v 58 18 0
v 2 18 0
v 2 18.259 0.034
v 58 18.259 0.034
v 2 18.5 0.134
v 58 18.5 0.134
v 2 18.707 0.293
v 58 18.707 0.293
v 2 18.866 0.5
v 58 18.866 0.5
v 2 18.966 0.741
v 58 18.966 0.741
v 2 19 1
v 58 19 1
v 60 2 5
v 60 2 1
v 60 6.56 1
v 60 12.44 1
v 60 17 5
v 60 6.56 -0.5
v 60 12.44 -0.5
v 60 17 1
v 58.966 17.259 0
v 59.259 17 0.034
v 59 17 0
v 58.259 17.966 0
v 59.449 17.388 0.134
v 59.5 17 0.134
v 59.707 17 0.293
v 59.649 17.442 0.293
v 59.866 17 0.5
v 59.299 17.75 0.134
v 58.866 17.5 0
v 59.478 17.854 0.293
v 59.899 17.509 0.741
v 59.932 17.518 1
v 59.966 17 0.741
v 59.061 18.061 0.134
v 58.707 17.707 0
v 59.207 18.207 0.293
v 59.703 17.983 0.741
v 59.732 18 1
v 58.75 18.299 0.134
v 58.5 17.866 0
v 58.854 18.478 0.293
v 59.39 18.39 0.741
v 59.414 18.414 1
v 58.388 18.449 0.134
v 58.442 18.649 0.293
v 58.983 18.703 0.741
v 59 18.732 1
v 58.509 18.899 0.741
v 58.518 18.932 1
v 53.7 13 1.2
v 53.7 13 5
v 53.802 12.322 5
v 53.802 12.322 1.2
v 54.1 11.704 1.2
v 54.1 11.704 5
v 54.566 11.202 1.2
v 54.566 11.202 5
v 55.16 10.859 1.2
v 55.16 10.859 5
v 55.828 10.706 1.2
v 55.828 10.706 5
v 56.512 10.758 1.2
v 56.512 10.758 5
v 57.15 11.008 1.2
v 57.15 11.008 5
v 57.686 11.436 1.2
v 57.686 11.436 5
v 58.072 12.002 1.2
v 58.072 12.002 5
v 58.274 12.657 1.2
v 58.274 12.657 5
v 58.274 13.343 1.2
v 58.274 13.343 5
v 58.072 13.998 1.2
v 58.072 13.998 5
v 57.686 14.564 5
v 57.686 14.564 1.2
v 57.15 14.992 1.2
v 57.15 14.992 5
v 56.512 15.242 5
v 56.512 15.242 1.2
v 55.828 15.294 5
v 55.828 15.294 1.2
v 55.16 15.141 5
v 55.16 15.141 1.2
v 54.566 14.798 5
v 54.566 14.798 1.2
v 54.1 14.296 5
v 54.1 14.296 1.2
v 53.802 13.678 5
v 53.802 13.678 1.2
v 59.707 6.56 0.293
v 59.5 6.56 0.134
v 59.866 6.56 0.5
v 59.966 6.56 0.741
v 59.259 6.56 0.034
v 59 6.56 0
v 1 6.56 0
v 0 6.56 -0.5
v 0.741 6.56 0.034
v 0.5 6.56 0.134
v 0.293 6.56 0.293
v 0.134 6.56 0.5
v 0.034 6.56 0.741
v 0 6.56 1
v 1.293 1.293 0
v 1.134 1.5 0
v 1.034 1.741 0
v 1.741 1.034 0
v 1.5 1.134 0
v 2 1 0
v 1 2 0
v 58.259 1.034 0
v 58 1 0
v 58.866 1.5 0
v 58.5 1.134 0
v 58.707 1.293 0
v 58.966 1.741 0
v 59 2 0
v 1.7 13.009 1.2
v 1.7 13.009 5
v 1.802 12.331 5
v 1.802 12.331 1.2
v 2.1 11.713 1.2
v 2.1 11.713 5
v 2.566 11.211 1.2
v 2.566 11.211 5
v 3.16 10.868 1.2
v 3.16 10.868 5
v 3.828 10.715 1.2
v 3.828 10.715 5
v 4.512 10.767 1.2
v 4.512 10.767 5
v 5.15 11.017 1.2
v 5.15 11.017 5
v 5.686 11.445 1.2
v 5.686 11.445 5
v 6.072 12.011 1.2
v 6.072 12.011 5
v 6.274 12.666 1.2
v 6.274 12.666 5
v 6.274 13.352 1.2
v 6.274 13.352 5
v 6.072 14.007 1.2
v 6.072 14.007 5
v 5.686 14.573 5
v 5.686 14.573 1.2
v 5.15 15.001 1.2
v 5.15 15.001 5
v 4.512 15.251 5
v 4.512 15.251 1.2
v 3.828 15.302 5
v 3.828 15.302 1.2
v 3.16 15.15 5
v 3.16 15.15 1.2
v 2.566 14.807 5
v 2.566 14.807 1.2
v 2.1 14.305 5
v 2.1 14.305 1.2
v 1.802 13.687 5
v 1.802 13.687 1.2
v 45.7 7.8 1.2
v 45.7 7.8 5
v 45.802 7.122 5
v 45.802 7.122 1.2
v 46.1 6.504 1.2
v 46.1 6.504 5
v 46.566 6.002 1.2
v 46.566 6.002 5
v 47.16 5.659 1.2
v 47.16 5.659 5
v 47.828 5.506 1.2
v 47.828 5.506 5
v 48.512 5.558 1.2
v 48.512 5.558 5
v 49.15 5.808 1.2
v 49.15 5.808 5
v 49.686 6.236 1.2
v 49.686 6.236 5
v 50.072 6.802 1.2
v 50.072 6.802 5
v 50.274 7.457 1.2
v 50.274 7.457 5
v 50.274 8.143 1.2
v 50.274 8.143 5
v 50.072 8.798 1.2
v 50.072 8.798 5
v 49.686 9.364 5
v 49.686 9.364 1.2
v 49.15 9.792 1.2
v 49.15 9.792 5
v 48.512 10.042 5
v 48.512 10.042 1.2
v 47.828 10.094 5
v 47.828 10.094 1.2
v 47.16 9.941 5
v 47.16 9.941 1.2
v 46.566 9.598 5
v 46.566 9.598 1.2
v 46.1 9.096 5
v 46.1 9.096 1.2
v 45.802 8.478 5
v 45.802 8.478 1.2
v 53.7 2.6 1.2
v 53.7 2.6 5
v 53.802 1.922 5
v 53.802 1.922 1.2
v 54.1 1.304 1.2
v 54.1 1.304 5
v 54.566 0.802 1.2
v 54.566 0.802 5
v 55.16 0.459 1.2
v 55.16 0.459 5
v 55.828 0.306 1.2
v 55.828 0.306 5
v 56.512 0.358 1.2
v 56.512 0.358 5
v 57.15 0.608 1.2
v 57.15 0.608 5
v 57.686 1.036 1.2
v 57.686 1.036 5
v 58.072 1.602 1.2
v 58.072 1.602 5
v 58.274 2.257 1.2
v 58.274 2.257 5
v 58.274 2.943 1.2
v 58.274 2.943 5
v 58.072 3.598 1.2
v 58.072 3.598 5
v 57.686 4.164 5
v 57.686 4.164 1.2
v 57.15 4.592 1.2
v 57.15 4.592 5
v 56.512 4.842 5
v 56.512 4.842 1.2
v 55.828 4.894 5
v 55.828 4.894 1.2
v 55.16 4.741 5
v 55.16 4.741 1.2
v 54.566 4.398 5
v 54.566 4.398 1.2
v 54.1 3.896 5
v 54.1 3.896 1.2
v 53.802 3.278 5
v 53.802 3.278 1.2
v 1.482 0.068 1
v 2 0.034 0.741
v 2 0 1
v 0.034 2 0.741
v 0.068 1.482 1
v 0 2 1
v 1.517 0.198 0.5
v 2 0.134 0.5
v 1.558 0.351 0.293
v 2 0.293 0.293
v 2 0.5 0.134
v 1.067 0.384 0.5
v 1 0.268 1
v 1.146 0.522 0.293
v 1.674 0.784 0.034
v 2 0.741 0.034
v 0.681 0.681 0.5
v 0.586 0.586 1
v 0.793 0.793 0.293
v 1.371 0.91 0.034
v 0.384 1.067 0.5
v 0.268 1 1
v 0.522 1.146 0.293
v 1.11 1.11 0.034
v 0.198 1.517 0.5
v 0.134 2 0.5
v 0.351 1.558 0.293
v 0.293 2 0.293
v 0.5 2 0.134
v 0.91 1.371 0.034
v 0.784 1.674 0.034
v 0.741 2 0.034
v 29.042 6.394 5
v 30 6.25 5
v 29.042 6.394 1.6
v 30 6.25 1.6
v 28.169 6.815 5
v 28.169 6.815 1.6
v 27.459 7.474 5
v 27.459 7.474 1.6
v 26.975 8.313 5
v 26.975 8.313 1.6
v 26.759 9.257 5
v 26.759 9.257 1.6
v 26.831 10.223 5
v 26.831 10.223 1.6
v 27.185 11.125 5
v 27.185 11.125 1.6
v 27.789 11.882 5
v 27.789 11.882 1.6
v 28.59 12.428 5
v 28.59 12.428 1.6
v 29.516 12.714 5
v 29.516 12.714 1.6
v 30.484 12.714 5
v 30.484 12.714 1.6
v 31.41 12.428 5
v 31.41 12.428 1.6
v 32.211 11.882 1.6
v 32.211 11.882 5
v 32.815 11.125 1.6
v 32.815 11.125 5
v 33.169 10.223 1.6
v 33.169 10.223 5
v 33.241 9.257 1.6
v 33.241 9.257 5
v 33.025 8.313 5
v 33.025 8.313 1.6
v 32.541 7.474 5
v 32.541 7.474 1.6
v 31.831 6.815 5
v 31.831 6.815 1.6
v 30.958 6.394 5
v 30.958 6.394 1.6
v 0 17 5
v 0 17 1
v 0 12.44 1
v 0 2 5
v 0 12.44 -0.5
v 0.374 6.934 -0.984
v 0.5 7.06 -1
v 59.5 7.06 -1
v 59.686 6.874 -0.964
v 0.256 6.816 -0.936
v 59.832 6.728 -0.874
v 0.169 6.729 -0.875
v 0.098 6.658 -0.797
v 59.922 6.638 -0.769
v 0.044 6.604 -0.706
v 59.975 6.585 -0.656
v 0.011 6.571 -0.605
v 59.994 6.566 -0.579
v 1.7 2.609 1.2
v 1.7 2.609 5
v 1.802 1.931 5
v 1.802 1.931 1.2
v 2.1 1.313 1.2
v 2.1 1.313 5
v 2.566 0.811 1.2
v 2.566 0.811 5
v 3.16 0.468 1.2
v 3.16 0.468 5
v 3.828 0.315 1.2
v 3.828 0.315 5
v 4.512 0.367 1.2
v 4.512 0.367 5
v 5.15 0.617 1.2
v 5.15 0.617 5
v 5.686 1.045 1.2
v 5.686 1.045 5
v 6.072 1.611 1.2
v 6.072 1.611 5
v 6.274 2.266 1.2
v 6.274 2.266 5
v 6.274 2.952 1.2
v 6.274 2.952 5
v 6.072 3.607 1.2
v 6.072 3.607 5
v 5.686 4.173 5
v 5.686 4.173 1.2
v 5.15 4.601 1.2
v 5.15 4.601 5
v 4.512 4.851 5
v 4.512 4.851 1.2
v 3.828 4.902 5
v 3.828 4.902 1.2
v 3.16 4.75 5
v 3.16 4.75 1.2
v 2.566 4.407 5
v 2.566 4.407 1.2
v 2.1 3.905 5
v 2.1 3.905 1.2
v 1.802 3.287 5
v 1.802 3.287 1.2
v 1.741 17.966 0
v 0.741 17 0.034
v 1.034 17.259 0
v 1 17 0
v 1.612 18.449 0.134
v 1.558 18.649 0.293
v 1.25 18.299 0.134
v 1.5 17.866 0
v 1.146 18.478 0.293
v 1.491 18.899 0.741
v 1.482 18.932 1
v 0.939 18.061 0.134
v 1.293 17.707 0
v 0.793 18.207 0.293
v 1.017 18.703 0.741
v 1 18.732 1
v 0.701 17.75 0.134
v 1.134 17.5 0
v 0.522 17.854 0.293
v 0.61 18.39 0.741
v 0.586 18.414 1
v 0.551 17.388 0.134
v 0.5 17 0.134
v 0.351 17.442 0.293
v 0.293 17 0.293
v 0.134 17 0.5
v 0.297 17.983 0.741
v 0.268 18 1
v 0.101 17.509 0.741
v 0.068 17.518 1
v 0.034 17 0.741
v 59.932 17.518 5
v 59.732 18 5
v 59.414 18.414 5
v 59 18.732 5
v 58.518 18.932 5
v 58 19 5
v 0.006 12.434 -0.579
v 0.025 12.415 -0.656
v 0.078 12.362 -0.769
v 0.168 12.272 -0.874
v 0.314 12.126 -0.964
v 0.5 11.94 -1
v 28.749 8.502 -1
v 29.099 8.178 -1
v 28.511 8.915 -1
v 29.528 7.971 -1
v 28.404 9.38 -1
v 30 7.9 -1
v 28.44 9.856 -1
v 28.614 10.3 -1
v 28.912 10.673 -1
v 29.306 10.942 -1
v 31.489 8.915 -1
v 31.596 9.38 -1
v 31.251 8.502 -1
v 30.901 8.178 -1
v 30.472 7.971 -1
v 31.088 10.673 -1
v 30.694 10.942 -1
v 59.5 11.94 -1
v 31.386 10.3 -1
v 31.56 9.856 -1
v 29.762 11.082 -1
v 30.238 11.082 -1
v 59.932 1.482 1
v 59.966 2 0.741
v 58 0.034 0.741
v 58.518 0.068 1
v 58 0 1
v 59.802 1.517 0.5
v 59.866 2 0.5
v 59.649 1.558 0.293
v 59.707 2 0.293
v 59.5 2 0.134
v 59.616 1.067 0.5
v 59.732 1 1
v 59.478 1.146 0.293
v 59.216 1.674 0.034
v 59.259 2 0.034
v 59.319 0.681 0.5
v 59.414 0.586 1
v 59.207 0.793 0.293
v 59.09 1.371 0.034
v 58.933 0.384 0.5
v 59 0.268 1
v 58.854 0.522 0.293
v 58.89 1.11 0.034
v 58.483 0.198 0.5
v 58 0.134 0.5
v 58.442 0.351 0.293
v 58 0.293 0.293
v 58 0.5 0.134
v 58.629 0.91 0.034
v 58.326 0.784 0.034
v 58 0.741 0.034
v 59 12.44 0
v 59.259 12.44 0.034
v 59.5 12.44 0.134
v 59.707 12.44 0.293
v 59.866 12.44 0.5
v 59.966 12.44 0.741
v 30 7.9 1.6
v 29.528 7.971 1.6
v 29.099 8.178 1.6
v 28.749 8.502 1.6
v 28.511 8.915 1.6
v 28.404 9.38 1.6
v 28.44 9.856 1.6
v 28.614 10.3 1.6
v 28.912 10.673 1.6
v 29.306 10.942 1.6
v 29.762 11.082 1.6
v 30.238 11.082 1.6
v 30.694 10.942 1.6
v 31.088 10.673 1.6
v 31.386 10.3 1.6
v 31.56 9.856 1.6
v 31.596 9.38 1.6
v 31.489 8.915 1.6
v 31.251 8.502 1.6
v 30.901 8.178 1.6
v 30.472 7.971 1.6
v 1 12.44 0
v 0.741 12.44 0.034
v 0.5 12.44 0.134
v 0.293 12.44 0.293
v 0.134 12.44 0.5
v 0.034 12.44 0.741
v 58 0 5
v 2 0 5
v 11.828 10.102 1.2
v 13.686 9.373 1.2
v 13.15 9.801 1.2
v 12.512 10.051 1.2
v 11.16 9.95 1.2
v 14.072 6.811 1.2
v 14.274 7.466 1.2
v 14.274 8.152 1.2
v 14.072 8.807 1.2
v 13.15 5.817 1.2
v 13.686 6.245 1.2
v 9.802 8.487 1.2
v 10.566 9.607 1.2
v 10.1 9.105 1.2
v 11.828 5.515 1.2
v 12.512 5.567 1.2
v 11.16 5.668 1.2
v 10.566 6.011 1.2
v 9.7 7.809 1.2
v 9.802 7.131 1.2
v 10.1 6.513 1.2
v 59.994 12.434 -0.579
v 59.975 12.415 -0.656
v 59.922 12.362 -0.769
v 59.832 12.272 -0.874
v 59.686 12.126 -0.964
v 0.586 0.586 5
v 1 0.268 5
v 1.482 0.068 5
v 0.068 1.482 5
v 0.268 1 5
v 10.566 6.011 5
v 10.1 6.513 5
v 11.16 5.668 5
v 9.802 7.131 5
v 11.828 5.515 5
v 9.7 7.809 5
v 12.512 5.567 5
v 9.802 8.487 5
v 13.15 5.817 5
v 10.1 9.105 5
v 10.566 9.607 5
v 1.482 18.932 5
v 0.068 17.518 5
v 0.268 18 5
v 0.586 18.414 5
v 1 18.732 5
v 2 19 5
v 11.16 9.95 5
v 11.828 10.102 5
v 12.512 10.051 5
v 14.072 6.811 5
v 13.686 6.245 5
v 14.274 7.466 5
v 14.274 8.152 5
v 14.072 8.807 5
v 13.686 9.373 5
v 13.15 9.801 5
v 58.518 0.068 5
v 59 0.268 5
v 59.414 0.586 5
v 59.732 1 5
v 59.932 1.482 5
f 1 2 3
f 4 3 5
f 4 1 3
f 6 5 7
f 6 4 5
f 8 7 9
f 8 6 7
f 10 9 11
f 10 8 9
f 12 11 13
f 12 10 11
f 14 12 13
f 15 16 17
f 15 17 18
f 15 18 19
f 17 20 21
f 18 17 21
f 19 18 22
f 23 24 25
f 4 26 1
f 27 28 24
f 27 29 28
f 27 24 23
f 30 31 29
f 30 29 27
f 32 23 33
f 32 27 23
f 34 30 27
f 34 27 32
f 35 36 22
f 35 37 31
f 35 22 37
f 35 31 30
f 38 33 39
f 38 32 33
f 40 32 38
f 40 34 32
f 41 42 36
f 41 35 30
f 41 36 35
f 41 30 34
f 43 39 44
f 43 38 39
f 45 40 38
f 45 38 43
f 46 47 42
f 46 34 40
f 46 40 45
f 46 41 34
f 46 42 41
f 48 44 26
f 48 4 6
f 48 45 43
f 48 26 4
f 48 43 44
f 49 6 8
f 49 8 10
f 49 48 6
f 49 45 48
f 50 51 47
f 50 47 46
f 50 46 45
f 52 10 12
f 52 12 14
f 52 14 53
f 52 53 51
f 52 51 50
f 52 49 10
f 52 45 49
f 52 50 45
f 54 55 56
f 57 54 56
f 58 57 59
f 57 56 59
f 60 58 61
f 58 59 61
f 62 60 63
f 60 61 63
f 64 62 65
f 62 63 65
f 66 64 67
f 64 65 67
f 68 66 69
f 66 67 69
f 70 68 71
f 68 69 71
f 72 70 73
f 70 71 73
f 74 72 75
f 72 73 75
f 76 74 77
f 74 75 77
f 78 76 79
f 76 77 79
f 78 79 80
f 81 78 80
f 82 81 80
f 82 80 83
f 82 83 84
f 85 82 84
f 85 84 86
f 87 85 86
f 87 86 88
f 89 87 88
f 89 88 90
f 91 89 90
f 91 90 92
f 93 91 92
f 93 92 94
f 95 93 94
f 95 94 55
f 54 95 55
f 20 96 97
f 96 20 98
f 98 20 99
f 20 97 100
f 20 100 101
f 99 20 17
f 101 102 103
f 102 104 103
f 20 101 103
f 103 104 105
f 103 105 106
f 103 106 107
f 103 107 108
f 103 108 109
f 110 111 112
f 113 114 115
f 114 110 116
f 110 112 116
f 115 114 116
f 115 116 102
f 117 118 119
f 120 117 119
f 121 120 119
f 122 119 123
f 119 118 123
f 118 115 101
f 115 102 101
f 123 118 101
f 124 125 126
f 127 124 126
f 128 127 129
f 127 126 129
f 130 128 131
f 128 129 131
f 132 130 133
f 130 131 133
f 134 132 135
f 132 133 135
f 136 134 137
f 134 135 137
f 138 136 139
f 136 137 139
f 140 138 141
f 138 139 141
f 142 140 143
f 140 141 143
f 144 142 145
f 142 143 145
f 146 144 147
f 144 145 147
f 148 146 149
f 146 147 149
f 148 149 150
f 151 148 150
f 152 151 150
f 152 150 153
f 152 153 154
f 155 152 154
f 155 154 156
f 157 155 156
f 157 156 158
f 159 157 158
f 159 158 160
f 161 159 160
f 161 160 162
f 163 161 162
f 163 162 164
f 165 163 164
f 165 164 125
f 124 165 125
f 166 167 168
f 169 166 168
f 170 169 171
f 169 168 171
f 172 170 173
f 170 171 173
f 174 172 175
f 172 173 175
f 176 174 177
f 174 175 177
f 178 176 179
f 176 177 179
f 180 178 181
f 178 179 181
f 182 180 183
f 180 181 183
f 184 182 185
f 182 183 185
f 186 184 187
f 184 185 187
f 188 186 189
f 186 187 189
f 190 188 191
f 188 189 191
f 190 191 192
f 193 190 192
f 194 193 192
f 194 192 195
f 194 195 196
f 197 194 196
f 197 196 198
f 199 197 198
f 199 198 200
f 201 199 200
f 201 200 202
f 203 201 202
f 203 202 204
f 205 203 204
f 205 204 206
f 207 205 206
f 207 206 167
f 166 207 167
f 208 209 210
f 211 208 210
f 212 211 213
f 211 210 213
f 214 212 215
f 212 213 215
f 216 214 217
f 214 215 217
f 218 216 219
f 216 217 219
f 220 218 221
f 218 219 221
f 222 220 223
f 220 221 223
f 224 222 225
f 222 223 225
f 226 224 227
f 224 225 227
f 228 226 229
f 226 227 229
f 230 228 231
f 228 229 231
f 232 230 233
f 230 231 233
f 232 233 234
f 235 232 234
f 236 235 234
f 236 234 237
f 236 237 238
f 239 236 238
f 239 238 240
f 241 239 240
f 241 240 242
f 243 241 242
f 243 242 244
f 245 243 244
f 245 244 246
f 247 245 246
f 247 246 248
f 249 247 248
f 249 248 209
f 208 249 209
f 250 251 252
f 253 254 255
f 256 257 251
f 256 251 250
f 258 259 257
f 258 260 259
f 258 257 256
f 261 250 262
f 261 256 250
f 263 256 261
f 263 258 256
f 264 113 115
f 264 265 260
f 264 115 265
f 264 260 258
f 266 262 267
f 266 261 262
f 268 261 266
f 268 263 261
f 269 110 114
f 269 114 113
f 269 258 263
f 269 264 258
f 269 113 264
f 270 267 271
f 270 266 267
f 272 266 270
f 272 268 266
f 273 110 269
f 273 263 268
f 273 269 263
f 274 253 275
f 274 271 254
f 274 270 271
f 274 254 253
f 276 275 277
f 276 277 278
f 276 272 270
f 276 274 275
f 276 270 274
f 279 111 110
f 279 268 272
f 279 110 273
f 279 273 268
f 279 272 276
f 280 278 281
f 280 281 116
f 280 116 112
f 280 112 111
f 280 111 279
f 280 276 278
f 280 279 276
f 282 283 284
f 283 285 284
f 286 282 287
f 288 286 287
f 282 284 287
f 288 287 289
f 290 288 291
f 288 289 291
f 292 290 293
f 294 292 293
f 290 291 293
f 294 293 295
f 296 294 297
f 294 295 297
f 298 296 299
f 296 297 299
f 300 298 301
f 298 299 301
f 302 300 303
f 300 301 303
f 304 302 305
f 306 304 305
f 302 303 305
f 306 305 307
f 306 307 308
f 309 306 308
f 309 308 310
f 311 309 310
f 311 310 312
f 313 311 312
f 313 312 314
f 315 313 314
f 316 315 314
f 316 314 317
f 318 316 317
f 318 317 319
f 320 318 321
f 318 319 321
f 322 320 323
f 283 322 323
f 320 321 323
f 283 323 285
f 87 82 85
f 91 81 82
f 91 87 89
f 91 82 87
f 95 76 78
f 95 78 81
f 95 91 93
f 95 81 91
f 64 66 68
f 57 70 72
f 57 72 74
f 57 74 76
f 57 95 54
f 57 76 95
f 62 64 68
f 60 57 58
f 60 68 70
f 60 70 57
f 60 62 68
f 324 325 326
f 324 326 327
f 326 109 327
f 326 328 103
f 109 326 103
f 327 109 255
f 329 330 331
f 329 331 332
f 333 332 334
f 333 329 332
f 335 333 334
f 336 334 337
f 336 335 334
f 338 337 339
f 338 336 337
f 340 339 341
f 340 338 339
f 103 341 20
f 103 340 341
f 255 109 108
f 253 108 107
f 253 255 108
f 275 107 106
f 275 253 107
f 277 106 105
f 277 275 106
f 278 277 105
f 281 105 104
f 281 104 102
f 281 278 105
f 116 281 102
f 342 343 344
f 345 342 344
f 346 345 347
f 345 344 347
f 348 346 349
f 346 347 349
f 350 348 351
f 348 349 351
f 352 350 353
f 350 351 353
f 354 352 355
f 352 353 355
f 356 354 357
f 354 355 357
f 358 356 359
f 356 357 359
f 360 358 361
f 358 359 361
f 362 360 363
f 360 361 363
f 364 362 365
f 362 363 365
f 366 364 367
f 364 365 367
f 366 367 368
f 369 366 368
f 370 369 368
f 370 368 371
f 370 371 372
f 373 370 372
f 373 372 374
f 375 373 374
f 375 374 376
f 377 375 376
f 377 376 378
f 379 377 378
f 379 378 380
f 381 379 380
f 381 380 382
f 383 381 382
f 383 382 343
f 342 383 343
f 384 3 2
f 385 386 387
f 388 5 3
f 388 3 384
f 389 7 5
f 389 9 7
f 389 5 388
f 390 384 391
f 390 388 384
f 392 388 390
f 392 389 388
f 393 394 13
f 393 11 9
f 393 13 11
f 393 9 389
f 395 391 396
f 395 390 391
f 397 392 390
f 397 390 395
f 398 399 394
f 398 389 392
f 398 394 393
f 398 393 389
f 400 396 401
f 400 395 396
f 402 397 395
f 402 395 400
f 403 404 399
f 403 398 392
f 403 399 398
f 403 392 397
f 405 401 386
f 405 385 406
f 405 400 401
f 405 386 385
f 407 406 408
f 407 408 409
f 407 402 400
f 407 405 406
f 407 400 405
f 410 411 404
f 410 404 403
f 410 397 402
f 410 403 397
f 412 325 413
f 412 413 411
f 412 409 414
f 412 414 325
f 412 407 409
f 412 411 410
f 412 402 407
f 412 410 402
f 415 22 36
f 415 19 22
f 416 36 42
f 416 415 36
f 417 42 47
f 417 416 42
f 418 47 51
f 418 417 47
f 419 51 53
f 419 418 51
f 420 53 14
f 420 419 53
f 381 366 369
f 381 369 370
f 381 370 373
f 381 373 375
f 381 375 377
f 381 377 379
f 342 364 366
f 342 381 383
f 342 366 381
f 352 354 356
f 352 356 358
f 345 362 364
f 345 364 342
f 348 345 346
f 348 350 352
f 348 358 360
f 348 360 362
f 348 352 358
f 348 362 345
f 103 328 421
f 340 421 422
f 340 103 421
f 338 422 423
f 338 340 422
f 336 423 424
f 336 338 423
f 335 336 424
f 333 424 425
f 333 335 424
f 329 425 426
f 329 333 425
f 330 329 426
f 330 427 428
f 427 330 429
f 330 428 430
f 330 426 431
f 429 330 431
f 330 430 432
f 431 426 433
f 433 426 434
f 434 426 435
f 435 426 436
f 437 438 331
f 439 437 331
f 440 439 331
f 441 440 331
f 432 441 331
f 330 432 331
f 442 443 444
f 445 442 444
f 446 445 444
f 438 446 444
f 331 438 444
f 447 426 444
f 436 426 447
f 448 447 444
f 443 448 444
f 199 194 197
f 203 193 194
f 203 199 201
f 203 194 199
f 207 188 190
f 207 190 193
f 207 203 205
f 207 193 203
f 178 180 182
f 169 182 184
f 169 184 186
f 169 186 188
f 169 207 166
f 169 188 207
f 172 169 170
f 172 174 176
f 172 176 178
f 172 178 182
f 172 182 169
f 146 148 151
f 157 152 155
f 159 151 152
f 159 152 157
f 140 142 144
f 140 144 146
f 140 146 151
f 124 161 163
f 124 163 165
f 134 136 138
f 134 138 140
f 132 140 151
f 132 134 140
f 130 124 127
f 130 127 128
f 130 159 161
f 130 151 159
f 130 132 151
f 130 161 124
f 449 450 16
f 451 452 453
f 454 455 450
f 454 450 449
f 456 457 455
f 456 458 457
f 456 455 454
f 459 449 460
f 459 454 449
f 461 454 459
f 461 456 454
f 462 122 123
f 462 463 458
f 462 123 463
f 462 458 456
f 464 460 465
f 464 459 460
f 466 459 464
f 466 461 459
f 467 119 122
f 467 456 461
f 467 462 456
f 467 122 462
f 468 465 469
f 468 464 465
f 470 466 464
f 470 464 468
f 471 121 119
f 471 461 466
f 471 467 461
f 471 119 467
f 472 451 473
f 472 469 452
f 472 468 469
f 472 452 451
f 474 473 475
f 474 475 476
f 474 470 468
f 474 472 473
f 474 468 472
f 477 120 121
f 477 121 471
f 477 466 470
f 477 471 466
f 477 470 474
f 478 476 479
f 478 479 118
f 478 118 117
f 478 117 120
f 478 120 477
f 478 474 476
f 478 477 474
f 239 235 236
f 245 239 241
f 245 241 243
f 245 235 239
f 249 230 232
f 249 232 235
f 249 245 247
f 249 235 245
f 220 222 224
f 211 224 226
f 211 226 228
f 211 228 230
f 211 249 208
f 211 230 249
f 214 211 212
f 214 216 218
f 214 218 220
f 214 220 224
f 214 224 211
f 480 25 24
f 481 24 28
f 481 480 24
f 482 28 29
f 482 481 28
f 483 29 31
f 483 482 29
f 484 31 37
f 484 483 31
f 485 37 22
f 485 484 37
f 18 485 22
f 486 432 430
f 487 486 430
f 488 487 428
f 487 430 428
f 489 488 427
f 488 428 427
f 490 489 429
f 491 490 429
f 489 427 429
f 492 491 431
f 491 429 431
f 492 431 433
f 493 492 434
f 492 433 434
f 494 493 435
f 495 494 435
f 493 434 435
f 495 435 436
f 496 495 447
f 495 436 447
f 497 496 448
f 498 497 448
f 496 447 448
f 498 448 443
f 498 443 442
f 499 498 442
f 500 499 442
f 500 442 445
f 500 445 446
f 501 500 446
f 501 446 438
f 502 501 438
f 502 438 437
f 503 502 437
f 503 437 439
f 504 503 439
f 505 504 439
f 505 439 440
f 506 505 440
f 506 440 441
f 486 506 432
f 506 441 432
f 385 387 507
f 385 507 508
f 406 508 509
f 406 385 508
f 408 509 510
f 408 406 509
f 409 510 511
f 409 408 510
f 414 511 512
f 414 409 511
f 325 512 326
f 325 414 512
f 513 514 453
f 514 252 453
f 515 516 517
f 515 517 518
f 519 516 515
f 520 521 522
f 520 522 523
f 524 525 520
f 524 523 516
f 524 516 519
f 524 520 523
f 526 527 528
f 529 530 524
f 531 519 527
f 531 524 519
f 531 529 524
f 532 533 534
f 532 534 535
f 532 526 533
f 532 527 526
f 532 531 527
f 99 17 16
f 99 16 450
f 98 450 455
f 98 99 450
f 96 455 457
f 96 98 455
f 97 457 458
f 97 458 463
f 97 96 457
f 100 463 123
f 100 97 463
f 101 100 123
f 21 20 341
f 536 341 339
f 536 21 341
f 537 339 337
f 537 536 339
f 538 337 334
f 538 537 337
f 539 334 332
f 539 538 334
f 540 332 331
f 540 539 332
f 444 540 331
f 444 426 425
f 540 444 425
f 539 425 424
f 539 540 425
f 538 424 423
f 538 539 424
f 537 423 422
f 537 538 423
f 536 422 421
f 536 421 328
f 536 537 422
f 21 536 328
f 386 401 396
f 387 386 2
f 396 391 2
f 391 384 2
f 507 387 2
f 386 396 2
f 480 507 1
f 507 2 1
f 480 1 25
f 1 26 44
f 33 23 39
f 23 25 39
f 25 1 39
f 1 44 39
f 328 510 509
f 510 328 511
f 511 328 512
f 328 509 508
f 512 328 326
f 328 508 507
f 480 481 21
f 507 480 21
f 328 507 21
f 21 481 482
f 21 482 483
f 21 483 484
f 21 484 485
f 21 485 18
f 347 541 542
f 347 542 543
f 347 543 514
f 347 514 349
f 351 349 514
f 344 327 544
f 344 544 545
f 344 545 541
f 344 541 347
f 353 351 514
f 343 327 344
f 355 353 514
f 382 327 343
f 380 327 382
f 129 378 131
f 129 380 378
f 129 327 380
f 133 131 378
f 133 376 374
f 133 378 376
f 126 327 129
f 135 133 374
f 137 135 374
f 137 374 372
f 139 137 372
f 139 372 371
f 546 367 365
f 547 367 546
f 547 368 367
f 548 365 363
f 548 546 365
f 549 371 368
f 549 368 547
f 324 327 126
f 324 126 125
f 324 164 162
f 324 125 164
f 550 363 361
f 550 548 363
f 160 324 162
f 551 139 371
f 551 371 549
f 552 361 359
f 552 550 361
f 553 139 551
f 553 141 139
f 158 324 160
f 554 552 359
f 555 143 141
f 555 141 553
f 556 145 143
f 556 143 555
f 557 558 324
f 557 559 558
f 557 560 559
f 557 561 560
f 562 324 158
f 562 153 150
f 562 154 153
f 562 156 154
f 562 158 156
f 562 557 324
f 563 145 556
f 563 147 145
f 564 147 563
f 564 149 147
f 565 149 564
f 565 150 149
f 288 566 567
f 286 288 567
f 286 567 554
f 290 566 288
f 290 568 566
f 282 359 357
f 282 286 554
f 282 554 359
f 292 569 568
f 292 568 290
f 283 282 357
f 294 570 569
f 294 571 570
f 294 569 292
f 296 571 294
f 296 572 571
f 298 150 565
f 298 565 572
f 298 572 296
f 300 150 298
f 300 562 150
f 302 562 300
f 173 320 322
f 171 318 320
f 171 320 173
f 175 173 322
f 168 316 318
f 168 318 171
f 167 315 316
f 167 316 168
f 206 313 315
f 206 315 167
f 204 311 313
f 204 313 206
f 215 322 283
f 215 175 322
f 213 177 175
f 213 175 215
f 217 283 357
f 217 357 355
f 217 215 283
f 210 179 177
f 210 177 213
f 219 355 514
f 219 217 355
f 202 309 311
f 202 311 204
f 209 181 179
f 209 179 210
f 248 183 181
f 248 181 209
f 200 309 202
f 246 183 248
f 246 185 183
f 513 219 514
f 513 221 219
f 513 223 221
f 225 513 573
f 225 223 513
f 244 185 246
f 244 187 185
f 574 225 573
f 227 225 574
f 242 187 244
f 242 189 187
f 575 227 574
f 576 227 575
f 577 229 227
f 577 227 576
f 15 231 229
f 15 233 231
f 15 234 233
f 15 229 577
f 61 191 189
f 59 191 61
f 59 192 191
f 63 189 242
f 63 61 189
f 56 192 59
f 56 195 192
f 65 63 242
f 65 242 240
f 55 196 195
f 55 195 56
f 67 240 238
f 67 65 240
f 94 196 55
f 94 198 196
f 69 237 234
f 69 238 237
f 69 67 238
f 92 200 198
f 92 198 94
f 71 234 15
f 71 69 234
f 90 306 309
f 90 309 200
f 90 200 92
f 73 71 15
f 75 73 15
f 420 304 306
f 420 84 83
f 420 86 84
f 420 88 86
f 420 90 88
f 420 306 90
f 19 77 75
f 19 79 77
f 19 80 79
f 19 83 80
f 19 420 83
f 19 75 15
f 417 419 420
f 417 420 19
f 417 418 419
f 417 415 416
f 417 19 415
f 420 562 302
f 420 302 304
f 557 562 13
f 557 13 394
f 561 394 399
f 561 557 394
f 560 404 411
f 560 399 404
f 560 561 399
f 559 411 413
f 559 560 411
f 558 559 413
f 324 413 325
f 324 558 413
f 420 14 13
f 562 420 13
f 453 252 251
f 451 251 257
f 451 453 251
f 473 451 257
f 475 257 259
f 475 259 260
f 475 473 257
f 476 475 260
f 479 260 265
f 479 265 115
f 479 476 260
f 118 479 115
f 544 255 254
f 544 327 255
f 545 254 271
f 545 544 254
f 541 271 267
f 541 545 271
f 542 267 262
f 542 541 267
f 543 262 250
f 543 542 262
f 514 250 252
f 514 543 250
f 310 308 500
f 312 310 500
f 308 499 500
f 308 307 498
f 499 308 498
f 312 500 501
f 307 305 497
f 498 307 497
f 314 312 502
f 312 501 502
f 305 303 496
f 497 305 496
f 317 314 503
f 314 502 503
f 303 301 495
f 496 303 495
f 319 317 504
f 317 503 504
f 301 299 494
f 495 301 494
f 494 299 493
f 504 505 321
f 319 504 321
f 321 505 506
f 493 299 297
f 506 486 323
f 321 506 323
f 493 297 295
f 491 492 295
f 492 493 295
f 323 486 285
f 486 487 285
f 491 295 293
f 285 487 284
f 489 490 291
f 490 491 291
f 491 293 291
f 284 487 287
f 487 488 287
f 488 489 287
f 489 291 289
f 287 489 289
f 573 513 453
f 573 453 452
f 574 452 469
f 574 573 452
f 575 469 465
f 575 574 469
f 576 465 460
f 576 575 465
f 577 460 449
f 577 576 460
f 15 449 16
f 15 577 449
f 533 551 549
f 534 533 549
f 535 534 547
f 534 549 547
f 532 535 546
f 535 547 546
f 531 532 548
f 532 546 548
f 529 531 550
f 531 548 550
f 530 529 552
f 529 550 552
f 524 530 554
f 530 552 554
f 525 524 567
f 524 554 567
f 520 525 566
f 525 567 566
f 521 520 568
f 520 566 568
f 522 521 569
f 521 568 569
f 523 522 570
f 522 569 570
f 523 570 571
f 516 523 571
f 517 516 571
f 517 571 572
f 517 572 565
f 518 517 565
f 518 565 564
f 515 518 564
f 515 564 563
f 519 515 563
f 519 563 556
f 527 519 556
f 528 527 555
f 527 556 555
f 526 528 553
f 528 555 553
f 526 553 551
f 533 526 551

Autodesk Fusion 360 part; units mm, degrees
sketch "草图1" plane through (0, 0, 0) normal (0, 0, 1) x (1, 0, 0)
  line L0 (0, 0) -> (60, 0)
  line L1 (60, 0) -> (60, 19)
  line L2 (60, 19) -> (0, 19)
  line L3 (0, 19) -> (0, 0)
  line L4 (0, 9.5) -> (60, 9.5) construction
  line L5 (0, 12.44) -> (60, 12.44)
  line L6 (60, 12.44) -> (60, 6.56)
  line L7 (60, 6.56) -> (0, 6.56)
  line L8 (0, 6.56) -> (0, 12.44)
  line L9 (0, 12.44) -> (60, 6.56) construction
  line L10 (60, 12.44) -> (0, 6.56) construction
  point P0 (30, 9.5)
  point P1 (30, 9.5)
  dimension "d1" = 60
  dimension "d2" = 19
  dimension "d3" = 60
  dimension "d4" = 5.88
extrude "拉伸1" add sketch "草图1" along normal blind 5
extrude "拉伸2" add sketch "草图1" against normal blind 1 contours L1 L3 L5 L6 L7 L8
sketch "草图2" plane through (0, 0, 5) normal (0, 0, 1) x (-1, 0, 0)
  line L0 (0, 0) -> (-60, 0)
  line L1 (-60, 0) -> (-60, -19)
  line L2 (-60, -19) -> (0, -19)
  line L3 (0, -19) -> (0, 0)
  point P0 (-30, -9.5)
hole "孔1" at (30, 9.5, 5) direction (0, 0, -1) diameter 3.2 depth 8 tip angle 180 counterbore diameter 6.5 counterbore depth 3.4
sketch "草图4" plane through (0, 0, 5) normal (0, 0, 1) x (-1, 0, 0)
  circle A0 centre (-30, -9.5) radius 3.25
  line L0 (0, 0) -> (-60, 0)
  line L1 (-60, 0) -> (-60, -19)
  line L2 (-60, -19) -> (0, -19)
  line L3 (0, -19) -> (0, 0)
  line L4 (-40.689, -19) -> (-40.689, 3.3911)
  circle A1 centre (-56, -2.6) radius 2.3
  circle A2 centre (-56, -13) radius 2.3
  circle A3 centre (-48, -7.8) radius 2.3
  line L5 (-40.689, 3.3911) -> (-60, 3.3911)
  line L6 (-60, -19) -> (-40.689, -19)
  line L7 (-60, 3.3911) -> (-60, -19)
  line L8 (-19.311, -19) -> (0, -19)
  line L9 (-19.311, 3.3911) -> (-19.311, -19)
  line L10 (0, -19) -> (0, 3.3911)
  line L11 (0, 3.3911) -> (-19.311, 3.3911)
  circle A4 centre (-4, -2.6089) radius 2.3
  circle A5 centre (-12, -7.8089) radius 2.3
  circle A6 centre (-4, -13.0089) radius 2.3
  point P0 (-60, -19)
  point P1 (-60, -19)
  dimension "d14" = 4.6
  dimension "d15" = 4.6
  dimension "d16" = 4.6
  dimension "d17" = 4.6
  dimension "d18" = 4.6
  dimension "d19" = 4.6
extrude "拉伸3" cut sketch "草图4" against normal blind 3.8 contours A1 | A2 | A3 | A4 | A5 | A6
fillet "圆角1" radius 2 4 edges at (60, 0, 2.5) (60, 19, 2.5) (0, 19, 2.5) (0, 0, 2.5)
fillet "圆角2" radius 0.5 4 edges at (60, 9.5, -1) (30, 6.56, -1) (30, 12.44, -1) (0, 9.5, -1)
fillet "圆角3" radius 1 10 edges at (0, 4.28, 0) (0.5858, 0.5858, 0) (30, 0, 0) (59.4142, 0.5858, 0) (60, 4.28, 0) (60, 14.72, 0) (59.4142, 18.4142, 0) (30, 19, 0) (0.5858, 18.4142, 0) (0, 14.72, 0)
